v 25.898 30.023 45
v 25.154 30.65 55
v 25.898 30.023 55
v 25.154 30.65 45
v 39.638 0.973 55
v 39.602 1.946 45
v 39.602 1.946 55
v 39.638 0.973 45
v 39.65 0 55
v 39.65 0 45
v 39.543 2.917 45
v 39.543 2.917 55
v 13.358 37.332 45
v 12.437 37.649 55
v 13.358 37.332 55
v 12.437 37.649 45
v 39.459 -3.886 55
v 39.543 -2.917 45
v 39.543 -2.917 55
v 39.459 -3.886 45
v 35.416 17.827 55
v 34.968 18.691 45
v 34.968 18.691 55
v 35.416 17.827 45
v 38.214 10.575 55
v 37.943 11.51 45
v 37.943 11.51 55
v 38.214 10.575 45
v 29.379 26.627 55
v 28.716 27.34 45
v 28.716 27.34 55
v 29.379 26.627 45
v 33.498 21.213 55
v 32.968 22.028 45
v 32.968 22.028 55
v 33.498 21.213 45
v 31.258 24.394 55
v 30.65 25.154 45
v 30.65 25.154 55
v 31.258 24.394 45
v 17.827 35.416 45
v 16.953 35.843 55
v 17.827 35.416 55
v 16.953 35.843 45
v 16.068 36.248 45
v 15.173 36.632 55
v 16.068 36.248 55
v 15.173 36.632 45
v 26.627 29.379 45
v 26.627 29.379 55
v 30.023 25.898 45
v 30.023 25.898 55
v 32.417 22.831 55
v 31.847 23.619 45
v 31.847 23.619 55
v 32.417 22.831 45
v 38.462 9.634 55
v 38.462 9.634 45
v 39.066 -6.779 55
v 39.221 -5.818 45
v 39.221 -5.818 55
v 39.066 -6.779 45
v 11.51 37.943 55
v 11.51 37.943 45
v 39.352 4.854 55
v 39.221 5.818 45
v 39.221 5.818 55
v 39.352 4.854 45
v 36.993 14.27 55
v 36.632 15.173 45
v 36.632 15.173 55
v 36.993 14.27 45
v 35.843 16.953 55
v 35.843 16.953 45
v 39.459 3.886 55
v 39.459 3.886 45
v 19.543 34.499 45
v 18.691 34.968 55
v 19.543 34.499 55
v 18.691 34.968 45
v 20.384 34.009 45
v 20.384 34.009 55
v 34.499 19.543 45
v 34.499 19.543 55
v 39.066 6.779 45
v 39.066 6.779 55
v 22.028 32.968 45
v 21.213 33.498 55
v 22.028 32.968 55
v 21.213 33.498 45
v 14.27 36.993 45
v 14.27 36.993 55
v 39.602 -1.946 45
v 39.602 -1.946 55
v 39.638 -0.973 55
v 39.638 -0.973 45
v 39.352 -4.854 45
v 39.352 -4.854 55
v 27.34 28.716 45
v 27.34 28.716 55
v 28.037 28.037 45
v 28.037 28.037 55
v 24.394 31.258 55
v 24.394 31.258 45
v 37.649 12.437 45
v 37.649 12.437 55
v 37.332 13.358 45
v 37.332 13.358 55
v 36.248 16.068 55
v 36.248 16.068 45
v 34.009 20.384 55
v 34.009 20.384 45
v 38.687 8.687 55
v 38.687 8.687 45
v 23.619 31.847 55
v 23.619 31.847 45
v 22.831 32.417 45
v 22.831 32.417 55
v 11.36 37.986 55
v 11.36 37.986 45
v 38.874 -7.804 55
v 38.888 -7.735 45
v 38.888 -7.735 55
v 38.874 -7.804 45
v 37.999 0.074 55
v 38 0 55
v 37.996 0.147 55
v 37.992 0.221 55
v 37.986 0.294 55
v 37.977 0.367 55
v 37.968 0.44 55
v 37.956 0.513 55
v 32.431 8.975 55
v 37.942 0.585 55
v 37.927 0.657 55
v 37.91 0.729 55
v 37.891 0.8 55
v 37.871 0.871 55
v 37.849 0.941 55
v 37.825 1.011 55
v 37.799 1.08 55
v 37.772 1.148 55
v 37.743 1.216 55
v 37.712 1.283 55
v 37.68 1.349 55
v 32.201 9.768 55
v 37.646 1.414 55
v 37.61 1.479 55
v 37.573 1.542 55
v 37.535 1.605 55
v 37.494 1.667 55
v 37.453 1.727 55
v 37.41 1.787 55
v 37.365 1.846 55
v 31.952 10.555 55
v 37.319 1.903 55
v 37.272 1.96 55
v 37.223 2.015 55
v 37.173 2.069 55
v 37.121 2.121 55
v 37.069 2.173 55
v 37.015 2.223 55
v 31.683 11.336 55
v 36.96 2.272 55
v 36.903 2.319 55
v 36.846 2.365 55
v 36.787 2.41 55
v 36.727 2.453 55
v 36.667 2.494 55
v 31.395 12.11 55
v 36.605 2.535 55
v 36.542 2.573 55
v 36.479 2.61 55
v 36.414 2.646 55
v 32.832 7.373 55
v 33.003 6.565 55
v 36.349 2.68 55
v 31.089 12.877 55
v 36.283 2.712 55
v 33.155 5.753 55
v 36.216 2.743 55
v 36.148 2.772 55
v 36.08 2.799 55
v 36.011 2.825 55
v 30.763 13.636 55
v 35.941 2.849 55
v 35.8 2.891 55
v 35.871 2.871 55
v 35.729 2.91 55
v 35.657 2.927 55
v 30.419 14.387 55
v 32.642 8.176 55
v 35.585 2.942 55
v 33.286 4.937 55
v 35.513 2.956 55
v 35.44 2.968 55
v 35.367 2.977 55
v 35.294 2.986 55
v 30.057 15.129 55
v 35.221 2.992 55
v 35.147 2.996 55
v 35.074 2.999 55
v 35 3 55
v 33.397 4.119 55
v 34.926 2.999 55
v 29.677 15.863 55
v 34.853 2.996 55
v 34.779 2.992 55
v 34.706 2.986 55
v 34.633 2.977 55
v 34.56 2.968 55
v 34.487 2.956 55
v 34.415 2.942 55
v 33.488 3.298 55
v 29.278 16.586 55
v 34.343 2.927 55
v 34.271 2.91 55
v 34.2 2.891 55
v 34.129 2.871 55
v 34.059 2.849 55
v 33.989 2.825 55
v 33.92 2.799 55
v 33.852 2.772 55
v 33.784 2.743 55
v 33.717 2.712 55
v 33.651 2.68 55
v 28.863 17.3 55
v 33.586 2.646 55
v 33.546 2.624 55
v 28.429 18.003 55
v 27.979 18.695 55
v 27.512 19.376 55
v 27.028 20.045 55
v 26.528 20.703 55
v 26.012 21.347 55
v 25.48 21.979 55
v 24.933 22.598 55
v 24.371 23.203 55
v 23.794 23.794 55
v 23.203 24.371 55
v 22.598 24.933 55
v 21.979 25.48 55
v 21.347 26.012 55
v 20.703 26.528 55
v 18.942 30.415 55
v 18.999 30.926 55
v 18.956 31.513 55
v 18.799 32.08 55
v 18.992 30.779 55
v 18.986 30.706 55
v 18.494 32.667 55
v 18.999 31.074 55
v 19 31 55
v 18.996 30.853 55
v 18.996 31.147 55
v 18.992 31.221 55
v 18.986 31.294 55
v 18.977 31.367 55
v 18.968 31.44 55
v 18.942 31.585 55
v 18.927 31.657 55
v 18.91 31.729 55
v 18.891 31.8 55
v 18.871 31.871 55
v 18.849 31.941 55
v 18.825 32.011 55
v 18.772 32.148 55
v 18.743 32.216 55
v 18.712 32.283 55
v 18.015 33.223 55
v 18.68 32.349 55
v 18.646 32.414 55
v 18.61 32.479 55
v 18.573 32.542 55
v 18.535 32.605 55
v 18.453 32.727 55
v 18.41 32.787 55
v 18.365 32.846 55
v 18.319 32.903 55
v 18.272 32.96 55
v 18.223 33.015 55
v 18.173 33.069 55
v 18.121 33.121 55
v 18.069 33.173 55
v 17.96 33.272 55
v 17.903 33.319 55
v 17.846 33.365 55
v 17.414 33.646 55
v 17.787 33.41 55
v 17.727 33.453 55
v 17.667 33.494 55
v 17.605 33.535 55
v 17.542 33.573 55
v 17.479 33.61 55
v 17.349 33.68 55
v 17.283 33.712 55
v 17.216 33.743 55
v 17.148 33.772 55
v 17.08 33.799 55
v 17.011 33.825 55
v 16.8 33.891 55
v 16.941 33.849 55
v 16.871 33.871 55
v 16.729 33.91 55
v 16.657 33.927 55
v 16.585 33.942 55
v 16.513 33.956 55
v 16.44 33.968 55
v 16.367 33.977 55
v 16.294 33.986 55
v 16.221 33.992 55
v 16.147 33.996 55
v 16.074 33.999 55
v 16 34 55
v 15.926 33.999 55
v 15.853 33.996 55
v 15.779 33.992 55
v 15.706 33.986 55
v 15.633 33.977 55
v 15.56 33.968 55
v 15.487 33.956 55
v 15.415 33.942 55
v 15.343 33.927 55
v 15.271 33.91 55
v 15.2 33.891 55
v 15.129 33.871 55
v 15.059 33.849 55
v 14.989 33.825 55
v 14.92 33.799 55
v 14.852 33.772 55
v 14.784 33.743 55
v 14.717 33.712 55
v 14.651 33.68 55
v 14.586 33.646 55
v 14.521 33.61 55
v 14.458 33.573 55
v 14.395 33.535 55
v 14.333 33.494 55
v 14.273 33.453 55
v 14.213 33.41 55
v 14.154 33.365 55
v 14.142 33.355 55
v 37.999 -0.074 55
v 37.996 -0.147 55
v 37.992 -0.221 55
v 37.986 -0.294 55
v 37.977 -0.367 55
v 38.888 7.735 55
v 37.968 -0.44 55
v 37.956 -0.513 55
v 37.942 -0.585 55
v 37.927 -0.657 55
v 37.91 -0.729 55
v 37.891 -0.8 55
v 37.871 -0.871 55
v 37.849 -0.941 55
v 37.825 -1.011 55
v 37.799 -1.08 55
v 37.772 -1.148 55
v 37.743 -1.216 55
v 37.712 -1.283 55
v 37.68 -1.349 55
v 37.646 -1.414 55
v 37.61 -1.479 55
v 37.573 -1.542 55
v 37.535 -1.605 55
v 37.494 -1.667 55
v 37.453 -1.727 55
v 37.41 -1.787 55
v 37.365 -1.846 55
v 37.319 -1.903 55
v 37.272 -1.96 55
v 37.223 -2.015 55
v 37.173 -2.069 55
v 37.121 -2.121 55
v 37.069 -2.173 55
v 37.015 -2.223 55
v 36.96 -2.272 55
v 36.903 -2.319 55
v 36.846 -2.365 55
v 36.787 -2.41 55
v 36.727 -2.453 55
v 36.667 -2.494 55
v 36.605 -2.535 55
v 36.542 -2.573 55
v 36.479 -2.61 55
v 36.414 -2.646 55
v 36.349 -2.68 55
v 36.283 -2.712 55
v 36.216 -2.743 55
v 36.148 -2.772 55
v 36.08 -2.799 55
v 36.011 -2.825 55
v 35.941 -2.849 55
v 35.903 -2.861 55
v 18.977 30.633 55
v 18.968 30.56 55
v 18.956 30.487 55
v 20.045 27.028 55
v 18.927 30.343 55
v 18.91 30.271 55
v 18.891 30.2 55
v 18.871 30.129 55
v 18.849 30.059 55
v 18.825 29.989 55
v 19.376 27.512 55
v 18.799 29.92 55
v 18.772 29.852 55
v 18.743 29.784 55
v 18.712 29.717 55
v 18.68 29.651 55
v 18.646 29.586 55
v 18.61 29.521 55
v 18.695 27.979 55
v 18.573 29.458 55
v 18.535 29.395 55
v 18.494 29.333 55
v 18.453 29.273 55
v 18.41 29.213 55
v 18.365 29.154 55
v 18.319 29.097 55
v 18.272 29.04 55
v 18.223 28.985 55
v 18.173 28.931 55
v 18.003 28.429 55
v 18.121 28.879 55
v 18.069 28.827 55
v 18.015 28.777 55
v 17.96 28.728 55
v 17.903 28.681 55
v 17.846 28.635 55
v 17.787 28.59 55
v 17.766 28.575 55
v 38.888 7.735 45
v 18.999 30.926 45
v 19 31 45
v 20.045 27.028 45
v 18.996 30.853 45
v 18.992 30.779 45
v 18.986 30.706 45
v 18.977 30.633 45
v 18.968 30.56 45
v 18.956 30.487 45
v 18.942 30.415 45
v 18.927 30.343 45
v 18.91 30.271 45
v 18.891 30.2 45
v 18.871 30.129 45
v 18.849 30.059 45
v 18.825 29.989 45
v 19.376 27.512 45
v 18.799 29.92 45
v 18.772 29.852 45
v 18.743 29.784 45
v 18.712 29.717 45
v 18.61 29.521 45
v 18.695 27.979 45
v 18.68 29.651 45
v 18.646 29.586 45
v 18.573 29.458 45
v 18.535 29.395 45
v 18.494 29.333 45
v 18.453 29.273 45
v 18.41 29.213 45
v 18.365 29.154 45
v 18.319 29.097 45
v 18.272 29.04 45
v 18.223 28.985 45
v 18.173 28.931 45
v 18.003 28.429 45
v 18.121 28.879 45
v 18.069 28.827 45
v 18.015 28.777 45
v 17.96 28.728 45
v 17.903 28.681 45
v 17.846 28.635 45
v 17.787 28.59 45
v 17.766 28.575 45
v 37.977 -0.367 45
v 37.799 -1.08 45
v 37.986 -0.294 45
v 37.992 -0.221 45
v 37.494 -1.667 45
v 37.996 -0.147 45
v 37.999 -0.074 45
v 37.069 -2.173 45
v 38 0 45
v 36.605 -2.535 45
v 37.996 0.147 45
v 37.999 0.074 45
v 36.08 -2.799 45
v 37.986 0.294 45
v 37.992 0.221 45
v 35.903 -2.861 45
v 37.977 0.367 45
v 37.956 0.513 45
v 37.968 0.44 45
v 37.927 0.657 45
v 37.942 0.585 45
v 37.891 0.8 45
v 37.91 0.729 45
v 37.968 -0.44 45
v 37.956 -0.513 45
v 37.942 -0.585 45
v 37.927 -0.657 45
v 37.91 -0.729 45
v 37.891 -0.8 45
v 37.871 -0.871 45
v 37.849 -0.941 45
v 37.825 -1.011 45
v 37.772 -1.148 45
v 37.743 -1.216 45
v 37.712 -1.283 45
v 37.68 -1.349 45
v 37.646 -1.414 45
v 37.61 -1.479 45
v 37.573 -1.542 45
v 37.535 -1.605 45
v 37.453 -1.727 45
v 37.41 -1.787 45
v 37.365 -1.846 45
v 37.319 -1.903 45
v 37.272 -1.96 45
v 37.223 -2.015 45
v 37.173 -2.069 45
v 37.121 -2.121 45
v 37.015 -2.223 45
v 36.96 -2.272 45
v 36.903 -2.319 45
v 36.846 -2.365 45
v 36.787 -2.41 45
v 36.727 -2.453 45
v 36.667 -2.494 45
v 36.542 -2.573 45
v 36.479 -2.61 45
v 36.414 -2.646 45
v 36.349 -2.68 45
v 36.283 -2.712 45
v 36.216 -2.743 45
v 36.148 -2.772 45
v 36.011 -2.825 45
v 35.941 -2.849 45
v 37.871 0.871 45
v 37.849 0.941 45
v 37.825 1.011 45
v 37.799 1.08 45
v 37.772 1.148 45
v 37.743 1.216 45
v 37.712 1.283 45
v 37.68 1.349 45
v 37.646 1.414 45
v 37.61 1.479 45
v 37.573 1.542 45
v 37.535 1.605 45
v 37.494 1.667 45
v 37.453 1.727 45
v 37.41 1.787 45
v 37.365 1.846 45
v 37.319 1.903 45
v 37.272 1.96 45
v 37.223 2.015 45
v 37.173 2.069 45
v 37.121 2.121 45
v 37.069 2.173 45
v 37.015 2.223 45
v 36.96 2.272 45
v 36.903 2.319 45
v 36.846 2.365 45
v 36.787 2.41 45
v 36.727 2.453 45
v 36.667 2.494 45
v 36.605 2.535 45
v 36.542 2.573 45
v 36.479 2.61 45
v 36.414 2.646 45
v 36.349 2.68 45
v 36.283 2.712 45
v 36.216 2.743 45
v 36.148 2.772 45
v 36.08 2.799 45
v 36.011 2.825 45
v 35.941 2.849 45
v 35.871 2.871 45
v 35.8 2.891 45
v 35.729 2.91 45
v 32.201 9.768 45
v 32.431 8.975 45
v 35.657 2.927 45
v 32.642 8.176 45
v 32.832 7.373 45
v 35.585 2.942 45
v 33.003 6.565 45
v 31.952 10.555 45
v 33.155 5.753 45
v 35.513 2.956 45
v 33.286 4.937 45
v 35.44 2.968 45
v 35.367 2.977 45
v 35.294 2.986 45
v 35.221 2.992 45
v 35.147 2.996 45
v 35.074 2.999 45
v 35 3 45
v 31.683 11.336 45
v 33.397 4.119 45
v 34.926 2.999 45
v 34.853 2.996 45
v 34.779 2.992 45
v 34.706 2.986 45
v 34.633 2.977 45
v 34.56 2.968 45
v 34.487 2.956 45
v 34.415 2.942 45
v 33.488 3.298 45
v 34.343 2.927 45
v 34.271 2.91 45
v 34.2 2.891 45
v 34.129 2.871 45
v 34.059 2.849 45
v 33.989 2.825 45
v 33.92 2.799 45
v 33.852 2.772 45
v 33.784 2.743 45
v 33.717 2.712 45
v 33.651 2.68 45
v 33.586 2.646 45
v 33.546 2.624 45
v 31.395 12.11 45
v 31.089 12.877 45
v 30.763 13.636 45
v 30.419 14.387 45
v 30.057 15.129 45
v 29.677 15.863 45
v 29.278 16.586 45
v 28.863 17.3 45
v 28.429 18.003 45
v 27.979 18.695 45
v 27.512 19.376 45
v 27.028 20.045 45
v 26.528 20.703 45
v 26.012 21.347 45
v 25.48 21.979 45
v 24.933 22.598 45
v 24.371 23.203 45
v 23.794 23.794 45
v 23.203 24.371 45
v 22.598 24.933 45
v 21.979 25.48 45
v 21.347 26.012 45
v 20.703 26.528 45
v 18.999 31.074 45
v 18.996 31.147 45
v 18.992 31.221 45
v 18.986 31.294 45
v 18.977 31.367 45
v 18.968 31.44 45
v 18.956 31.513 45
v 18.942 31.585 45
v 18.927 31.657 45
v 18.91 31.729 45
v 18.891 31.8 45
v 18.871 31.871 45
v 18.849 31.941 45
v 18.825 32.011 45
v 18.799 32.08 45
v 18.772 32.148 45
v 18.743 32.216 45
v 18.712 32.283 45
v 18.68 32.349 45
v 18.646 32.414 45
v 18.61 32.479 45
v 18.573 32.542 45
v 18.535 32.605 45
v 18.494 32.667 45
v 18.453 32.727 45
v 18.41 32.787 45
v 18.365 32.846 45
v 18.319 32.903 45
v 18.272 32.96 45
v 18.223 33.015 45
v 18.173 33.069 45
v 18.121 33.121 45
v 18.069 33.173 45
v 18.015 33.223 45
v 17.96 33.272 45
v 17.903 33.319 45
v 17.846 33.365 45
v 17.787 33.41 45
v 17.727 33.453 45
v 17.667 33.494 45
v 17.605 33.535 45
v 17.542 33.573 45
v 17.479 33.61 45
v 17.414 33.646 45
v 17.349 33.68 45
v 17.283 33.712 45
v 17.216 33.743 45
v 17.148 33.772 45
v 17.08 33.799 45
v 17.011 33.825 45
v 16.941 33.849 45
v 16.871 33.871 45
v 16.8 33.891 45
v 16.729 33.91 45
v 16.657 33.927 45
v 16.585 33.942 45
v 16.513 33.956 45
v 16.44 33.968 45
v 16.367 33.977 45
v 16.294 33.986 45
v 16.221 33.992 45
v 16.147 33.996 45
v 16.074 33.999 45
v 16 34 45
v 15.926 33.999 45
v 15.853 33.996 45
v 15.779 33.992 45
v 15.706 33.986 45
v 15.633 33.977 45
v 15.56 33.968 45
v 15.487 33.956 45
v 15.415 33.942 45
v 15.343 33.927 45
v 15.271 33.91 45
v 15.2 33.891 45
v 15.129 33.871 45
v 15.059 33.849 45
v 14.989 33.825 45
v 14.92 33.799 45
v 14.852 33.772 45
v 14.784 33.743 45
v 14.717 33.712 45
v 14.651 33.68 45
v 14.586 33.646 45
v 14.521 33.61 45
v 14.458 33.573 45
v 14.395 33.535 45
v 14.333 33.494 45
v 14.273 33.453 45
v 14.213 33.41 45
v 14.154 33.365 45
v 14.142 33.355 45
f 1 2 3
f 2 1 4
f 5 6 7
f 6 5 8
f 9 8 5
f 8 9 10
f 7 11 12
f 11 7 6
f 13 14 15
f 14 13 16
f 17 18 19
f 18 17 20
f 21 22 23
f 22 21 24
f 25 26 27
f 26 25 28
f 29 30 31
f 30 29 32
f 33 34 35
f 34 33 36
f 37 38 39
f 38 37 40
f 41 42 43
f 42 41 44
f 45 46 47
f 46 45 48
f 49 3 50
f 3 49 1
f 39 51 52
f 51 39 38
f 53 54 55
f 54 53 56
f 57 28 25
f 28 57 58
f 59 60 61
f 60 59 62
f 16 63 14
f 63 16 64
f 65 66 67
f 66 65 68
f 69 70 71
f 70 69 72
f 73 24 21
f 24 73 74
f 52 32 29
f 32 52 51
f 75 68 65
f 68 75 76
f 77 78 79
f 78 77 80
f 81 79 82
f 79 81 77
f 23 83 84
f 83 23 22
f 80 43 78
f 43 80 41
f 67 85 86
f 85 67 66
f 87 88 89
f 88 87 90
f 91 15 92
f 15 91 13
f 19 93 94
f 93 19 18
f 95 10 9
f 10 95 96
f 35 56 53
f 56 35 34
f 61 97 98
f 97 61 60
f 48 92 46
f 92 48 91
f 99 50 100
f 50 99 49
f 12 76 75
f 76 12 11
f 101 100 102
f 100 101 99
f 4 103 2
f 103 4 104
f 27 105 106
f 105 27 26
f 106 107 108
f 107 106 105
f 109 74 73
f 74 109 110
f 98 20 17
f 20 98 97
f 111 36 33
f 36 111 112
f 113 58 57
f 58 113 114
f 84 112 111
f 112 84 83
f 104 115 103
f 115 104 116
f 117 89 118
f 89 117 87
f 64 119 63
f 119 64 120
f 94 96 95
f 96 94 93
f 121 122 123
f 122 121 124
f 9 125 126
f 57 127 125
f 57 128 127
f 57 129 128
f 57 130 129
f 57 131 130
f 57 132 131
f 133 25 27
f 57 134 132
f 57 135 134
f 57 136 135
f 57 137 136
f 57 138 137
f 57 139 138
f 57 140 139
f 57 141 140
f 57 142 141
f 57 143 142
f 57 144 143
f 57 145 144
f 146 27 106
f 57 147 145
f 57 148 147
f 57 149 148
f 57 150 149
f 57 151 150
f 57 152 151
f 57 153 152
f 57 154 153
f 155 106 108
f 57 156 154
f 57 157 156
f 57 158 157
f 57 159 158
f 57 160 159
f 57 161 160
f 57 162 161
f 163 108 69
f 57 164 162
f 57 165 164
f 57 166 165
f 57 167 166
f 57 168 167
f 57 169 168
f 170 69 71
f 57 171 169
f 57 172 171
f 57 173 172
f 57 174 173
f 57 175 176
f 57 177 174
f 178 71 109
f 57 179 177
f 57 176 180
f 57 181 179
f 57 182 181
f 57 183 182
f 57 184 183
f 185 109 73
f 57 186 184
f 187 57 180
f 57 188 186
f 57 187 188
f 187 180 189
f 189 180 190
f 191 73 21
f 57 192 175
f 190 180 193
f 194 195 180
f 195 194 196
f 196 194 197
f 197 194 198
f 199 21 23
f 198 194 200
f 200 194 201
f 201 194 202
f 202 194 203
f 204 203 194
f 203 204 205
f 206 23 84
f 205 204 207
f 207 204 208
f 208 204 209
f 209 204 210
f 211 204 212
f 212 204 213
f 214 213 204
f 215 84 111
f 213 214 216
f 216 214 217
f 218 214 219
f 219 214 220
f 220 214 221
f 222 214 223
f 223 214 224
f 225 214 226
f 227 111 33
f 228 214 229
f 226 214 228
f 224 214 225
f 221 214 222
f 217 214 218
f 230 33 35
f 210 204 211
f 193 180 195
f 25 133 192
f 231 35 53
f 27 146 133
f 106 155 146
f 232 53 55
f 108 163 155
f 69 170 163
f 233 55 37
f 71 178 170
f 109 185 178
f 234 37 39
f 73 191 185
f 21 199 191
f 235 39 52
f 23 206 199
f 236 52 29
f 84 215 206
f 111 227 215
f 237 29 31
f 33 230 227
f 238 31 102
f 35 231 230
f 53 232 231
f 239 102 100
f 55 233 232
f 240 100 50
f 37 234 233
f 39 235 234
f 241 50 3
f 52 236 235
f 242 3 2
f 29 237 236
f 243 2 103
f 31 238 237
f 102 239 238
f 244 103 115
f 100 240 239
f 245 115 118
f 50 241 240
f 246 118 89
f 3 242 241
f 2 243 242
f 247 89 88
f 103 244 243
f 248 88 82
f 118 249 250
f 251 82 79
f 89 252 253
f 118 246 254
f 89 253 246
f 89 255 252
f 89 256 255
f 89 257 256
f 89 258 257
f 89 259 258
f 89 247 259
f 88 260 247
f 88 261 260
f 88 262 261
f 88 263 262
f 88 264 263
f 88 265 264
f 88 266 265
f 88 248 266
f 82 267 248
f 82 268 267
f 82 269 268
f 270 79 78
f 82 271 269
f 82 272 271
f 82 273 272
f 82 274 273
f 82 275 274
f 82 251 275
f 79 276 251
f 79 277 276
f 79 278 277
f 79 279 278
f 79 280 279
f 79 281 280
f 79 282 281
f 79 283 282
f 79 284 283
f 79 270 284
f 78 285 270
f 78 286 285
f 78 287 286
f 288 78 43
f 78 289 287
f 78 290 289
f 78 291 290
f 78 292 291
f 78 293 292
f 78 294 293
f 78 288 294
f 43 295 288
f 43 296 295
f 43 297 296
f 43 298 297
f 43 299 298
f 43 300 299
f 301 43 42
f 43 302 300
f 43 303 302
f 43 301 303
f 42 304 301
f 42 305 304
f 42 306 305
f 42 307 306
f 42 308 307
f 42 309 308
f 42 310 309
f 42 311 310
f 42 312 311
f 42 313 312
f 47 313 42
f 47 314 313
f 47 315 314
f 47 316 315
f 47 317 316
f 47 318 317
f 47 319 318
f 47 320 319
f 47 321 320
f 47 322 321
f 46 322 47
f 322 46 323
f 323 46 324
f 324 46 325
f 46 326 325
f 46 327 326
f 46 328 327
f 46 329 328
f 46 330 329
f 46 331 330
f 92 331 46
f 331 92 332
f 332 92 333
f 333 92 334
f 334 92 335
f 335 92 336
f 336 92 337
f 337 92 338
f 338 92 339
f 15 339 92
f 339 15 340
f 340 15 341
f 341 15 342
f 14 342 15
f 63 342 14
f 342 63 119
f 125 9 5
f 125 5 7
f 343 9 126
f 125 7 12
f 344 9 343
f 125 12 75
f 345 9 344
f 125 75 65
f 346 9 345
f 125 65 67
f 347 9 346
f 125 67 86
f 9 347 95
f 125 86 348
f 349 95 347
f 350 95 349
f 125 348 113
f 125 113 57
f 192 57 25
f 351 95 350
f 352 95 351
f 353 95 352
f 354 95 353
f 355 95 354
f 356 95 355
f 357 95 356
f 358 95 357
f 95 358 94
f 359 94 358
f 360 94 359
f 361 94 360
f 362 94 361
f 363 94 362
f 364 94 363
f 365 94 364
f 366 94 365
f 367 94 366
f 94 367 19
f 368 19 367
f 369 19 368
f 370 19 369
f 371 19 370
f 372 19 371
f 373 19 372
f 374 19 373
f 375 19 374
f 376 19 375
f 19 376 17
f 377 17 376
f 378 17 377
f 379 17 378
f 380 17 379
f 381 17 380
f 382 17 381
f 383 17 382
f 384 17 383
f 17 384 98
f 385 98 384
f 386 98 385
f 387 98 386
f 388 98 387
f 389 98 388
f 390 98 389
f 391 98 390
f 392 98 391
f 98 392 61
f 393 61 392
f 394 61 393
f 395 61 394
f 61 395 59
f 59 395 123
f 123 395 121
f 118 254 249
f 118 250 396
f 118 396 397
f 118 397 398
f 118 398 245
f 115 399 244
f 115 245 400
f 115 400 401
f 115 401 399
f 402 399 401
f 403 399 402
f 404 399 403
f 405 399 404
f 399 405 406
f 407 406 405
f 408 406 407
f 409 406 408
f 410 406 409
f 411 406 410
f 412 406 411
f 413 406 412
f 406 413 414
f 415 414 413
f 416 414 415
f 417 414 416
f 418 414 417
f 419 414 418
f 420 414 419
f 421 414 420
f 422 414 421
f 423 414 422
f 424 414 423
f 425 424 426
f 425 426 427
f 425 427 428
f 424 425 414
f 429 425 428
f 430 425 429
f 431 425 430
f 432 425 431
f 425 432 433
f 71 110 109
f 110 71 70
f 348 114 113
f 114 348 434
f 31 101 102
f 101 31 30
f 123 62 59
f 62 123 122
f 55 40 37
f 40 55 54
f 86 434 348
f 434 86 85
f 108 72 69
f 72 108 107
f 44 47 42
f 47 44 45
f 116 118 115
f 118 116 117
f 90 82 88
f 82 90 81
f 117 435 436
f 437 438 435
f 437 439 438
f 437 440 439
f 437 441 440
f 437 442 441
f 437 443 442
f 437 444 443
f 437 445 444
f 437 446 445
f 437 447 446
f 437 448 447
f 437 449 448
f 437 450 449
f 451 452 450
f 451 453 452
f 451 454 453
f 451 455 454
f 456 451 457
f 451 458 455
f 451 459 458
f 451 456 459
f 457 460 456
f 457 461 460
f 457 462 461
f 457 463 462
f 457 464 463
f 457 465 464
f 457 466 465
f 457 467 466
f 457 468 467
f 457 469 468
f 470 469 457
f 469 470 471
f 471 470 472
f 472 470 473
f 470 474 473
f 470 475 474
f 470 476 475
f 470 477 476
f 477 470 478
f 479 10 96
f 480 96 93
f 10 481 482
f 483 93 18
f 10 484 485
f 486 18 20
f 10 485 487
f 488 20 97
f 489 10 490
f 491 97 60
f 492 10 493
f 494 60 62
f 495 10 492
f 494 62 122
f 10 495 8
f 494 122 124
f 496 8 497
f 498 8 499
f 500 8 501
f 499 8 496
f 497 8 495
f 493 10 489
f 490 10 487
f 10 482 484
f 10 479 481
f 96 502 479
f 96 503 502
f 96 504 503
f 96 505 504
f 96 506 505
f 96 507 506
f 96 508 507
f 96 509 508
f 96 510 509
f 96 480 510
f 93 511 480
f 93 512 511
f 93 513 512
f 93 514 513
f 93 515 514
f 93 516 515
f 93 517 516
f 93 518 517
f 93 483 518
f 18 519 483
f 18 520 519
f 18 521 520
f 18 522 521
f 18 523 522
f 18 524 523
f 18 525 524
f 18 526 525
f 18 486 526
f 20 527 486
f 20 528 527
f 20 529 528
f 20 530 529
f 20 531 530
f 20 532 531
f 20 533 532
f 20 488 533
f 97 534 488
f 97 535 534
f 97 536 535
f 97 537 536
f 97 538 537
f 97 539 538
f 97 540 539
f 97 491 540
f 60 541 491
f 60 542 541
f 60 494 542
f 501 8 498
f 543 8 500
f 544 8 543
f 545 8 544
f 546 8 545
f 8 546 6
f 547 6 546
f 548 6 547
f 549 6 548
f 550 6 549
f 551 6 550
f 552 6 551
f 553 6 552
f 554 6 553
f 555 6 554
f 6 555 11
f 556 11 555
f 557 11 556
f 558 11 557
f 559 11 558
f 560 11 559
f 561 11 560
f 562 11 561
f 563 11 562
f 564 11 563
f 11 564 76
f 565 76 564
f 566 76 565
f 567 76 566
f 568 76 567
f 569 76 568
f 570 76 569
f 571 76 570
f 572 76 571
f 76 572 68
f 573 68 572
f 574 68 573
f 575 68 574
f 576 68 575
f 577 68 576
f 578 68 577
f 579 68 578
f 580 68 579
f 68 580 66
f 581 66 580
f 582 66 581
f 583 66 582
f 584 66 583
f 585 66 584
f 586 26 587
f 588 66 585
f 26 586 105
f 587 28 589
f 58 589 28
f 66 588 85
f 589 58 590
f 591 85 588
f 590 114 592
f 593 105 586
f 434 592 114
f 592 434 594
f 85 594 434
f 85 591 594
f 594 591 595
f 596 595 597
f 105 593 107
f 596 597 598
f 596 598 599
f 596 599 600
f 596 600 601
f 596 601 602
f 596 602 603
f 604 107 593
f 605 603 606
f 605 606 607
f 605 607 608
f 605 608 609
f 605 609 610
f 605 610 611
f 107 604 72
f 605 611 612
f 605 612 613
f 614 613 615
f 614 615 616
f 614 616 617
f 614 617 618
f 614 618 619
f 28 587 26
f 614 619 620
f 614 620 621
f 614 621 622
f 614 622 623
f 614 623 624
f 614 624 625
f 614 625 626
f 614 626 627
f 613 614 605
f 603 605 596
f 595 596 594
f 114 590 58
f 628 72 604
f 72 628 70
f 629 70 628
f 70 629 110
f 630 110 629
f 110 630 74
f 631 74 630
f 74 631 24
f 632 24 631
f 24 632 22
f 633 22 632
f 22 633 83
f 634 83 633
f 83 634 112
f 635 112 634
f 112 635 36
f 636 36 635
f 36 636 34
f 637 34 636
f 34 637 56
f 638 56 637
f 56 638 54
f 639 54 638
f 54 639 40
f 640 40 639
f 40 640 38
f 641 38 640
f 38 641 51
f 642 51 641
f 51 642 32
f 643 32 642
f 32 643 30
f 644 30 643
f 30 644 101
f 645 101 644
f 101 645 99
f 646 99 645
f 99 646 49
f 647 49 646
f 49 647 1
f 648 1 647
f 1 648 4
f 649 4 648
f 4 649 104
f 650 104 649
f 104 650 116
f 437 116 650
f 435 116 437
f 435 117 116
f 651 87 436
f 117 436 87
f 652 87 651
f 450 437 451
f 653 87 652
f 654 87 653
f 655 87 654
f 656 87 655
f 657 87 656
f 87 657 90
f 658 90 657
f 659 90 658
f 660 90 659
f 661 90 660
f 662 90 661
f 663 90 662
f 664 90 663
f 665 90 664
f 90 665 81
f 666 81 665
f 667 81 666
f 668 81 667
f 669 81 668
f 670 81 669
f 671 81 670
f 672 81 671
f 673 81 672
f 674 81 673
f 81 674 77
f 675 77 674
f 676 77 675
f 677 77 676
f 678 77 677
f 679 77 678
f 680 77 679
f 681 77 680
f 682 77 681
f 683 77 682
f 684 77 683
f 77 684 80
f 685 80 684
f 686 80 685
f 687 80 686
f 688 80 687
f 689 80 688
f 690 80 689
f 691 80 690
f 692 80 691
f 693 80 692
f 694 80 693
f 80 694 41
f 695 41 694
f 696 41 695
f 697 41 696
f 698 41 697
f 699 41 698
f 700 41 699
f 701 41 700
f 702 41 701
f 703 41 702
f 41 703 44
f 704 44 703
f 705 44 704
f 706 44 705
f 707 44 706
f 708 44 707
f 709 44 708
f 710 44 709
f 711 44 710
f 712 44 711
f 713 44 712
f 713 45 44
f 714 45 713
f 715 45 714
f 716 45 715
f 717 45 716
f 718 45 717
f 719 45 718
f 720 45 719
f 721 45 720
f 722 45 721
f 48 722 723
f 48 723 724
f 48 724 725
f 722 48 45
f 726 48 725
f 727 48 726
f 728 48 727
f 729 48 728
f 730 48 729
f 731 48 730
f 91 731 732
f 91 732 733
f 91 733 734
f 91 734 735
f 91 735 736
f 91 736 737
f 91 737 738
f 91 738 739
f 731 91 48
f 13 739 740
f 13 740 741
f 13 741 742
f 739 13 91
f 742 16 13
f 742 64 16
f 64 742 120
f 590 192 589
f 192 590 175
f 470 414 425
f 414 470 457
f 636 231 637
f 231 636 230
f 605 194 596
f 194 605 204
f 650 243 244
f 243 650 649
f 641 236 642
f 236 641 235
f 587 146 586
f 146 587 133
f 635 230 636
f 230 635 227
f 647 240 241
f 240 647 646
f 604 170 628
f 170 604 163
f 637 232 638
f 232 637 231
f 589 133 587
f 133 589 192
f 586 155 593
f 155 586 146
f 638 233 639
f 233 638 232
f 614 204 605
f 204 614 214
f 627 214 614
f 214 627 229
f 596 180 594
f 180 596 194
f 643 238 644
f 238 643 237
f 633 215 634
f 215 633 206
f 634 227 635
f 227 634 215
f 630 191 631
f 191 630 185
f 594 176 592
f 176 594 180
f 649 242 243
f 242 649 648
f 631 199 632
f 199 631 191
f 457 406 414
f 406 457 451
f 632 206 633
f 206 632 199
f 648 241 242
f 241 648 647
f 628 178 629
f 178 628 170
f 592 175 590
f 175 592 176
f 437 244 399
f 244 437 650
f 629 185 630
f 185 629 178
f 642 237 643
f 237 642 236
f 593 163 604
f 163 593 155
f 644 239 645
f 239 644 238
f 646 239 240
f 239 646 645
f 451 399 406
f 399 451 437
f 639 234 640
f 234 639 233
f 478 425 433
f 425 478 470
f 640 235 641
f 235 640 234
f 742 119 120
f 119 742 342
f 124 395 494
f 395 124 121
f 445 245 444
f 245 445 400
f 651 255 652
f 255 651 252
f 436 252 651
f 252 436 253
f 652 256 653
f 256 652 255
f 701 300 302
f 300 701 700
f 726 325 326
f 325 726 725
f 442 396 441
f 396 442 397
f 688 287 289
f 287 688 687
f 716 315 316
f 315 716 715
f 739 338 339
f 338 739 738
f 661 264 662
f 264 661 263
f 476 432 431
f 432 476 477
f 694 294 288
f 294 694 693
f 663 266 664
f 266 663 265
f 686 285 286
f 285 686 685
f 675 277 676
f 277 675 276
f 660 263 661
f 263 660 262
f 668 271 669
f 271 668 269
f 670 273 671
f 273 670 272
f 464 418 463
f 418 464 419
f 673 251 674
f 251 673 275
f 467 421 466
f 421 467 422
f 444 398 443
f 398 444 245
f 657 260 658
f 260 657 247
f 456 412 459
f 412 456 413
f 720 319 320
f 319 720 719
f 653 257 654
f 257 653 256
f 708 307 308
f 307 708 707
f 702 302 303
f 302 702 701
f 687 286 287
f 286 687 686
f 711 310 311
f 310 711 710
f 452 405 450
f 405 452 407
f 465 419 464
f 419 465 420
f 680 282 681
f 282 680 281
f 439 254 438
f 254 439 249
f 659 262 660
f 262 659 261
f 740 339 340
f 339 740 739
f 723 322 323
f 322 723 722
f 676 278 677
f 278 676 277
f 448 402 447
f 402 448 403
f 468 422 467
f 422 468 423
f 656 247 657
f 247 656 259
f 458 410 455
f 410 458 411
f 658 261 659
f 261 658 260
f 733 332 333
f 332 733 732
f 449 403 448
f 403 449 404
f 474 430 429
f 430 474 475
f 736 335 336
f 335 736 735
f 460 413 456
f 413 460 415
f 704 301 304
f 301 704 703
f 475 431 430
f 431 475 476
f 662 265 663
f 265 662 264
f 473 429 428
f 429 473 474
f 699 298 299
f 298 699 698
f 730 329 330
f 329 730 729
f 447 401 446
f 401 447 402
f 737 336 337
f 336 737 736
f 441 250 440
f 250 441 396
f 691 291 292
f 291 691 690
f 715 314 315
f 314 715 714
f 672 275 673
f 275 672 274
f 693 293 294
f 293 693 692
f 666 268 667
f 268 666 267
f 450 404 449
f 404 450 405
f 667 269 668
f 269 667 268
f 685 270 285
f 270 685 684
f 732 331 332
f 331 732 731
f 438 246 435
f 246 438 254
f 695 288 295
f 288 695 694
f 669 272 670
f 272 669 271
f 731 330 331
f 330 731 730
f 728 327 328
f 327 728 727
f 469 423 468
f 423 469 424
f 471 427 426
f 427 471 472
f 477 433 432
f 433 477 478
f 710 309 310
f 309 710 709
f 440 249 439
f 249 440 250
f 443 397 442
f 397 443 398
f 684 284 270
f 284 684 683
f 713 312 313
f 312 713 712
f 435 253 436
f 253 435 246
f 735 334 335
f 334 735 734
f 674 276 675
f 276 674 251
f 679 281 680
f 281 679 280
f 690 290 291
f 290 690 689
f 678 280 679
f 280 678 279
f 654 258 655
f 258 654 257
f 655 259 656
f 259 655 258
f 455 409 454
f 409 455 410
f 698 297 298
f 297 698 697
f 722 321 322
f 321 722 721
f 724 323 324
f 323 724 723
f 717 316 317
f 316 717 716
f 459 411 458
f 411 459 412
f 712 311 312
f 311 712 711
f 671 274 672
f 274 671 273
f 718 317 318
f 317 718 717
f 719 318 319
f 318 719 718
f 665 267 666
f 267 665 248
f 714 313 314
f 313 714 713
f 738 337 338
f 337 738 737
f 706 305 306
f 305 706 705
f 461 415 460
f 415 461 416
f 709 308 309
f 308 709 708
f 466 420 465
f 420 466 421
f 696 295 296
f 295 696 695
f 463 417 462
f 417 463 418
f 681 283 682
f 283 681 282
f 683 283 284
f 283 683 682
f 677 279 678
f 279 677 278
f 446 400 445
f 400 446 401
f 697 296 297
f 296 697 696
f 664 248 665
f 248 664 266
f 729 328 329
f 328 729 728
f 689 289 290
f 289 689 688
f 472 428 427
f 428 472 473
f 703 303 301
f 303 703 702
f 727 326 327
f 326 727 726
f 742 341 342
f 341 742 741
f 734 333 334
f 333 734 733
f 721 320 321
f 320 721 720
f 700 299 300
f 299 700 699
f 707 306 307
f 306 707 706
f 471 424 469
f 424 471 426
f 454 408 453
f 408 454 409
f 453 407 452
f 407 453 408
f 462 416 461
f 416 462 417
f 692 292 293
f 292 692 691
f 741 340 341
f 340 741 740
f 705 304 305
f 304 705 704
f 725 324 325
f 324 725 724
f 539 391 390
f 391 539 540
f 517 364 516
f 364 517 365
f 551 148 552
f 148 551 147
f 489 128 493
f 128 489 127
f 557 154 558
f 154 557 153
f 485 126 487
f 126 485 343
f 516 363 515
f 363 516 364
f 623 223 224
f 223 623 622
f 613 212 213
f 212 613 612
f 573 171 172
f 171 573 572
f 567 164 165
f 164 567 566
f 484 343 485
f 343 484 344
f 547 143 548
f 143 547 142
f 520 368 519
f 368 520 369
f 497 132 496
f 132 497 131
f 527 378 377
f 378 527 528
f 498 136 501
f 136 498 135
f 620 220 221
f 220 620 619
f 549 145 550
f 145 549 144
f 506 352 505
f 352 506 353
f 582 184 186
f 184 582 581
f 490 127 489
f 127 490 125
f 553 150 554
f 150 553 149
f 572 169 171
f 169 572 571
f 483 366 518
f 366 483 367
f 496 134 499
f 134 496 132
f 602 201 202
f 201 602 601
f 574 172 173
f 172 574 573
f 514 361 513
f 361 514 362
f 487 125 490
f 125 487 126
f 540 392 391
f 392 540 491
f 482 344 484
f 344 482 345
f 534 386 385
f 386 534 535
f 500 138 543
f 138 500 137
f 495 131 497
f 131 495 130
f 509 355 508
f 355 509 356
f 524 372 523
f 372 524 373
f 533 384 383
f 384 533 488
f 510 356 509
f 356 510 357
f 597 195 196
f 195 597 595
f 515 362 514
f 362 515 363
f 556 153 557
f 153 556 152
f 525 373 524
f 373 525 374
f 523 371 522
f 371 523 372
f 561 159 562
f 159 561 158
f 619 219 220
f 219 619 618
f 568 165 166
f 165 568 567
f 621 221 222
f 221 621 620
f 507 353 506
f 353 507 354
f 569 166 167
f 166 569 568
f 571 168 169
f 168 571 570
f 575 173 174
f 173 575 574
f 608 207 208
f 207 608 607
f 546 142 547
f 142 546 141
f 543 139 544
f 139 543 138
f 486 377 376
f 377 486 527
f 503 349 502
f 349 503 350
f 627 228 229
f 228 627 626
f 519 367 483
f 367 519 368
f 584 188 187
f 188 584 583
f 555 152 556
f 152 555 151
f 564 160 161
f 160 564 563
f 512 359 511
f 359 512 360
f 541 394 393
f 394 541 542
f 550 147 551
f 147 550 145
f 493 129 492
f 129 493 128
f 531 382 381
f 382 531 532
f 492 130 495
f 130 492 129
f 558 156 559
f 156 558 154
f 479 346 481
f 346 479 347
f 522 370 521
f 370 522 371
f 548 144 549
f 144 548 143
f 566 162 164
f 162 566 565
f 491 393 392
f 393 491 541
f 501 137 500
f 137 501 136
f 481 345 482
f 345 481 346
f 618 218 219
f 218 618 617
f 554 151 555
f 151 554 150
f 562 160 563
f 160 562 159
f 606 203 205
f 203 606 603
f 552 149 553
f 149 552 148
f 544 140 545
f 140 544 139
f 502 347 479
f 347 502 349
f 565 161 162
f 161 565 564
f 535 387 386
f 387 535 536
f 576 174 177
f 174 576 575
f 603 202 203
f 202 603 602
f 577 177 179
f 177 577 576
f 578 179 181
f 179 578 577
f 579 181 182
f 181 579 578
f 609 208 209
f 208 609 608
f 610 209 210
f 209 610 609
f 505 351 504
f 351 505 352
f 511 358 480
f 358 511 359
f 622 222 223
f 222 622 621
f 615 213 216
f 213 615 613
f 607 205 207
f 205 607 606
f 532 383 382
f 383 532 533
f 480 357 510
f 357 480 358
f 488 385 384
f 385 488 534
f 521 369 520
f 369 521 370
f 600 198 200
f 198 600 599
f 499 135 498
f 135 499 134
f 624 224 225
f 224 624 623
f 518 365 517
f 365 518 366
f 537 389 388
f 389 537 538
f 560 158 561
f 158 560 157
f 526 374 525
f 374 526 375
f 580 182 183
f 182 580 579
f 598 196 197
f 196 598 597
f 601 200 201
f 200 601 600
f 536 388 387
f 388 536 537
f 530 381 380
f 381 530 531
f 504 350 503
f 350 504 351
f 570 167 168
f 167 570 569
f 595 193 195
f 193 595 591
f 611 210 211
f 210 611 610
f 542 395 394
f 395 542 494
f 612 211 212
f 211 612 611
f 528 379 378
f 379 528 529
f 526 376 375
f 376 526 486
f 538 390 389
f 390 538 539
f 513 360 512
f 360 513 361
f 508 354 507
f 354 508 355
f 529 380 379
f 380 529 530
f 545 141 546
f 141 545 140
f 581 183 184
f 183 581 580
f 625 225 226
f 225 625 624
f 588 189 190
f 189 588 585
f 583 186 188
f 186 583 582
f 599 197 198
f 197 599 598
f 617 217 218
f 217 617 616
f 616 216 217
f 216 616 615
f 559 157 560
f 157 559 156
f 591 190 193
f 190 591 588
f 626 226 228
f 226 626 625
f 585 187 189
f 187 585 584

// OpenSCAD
$fn=256;

// hva skal lages?
handtak=true;
underlag=false;

//radius=32;
radius=33.65;
height=100;
height2=10;
thickness=1;
start_a=0;
end_a=62;

//start_a=-31.5;
//end_a=31.5;

radius2=radius;
//radius3=31.1;
//thickness2=5.0;
thickness2=12.0;
thickness3=2.5;

/*
difference() {
    cylinder(r=radius, h=height);
    cylinder(r=radius-thickness, h=height);
}
*/
module sector(h, d, a1, a2) {
    if (a2 - a1 > 180) {
        difference() {
            cylinder(h=h, d=d);
            translate([0,0,-0.5]) sector(h+1, d+1, a2-360, a1); 
        }
    } else {
        difference() {
            cylinder(h=h, d=d);
            rotate([0,0,a1]) translate([-d/2, -d/2, -0.5])
                cube([d, d/2, h+1]);
            rotate([0,0,a2]) translate([-d/2, 0, -0.5])
                cube([d, d/2, h+1]);
        }
    }
}  
if (handtak) {
    translate([0,0,height/2-height2/2]) {
        /*
        difference() {
            sector(height2, radius2*2+thickness2, start_a, end_a);
            sector(height2, radius2*2, start_a, end_a);
            sector(height2, radius2*2+thickness2/2, start_a-.1, start_a+5);
            sector(height2, radius2*2+thickness2/2, end_a-5, end_a+.1);
        }
        */
        difference() {
            sector(height2, radius2*2+thickness2, start_a-15, end_a+15);
            sector(height2, radius2*2, start_a-16, end_a+16);
            translate([31,-18,-1])
                rotate([0,0,31])
                    cube([thickness2,thickness2*5,thickness2]);
            translate([16,31,-1])
                cylinder(h=thickness2,d=thickness2/2);
            translate([35,0,-1])
                cylinder(h=thickness2,d=thickness2/2);
        }
    }
}
if (underlag) {
    difference() {
        sector(height, radius*2, start_a, end_a);
        cylinder(h=height, r=radius-thickness);

    }
}
